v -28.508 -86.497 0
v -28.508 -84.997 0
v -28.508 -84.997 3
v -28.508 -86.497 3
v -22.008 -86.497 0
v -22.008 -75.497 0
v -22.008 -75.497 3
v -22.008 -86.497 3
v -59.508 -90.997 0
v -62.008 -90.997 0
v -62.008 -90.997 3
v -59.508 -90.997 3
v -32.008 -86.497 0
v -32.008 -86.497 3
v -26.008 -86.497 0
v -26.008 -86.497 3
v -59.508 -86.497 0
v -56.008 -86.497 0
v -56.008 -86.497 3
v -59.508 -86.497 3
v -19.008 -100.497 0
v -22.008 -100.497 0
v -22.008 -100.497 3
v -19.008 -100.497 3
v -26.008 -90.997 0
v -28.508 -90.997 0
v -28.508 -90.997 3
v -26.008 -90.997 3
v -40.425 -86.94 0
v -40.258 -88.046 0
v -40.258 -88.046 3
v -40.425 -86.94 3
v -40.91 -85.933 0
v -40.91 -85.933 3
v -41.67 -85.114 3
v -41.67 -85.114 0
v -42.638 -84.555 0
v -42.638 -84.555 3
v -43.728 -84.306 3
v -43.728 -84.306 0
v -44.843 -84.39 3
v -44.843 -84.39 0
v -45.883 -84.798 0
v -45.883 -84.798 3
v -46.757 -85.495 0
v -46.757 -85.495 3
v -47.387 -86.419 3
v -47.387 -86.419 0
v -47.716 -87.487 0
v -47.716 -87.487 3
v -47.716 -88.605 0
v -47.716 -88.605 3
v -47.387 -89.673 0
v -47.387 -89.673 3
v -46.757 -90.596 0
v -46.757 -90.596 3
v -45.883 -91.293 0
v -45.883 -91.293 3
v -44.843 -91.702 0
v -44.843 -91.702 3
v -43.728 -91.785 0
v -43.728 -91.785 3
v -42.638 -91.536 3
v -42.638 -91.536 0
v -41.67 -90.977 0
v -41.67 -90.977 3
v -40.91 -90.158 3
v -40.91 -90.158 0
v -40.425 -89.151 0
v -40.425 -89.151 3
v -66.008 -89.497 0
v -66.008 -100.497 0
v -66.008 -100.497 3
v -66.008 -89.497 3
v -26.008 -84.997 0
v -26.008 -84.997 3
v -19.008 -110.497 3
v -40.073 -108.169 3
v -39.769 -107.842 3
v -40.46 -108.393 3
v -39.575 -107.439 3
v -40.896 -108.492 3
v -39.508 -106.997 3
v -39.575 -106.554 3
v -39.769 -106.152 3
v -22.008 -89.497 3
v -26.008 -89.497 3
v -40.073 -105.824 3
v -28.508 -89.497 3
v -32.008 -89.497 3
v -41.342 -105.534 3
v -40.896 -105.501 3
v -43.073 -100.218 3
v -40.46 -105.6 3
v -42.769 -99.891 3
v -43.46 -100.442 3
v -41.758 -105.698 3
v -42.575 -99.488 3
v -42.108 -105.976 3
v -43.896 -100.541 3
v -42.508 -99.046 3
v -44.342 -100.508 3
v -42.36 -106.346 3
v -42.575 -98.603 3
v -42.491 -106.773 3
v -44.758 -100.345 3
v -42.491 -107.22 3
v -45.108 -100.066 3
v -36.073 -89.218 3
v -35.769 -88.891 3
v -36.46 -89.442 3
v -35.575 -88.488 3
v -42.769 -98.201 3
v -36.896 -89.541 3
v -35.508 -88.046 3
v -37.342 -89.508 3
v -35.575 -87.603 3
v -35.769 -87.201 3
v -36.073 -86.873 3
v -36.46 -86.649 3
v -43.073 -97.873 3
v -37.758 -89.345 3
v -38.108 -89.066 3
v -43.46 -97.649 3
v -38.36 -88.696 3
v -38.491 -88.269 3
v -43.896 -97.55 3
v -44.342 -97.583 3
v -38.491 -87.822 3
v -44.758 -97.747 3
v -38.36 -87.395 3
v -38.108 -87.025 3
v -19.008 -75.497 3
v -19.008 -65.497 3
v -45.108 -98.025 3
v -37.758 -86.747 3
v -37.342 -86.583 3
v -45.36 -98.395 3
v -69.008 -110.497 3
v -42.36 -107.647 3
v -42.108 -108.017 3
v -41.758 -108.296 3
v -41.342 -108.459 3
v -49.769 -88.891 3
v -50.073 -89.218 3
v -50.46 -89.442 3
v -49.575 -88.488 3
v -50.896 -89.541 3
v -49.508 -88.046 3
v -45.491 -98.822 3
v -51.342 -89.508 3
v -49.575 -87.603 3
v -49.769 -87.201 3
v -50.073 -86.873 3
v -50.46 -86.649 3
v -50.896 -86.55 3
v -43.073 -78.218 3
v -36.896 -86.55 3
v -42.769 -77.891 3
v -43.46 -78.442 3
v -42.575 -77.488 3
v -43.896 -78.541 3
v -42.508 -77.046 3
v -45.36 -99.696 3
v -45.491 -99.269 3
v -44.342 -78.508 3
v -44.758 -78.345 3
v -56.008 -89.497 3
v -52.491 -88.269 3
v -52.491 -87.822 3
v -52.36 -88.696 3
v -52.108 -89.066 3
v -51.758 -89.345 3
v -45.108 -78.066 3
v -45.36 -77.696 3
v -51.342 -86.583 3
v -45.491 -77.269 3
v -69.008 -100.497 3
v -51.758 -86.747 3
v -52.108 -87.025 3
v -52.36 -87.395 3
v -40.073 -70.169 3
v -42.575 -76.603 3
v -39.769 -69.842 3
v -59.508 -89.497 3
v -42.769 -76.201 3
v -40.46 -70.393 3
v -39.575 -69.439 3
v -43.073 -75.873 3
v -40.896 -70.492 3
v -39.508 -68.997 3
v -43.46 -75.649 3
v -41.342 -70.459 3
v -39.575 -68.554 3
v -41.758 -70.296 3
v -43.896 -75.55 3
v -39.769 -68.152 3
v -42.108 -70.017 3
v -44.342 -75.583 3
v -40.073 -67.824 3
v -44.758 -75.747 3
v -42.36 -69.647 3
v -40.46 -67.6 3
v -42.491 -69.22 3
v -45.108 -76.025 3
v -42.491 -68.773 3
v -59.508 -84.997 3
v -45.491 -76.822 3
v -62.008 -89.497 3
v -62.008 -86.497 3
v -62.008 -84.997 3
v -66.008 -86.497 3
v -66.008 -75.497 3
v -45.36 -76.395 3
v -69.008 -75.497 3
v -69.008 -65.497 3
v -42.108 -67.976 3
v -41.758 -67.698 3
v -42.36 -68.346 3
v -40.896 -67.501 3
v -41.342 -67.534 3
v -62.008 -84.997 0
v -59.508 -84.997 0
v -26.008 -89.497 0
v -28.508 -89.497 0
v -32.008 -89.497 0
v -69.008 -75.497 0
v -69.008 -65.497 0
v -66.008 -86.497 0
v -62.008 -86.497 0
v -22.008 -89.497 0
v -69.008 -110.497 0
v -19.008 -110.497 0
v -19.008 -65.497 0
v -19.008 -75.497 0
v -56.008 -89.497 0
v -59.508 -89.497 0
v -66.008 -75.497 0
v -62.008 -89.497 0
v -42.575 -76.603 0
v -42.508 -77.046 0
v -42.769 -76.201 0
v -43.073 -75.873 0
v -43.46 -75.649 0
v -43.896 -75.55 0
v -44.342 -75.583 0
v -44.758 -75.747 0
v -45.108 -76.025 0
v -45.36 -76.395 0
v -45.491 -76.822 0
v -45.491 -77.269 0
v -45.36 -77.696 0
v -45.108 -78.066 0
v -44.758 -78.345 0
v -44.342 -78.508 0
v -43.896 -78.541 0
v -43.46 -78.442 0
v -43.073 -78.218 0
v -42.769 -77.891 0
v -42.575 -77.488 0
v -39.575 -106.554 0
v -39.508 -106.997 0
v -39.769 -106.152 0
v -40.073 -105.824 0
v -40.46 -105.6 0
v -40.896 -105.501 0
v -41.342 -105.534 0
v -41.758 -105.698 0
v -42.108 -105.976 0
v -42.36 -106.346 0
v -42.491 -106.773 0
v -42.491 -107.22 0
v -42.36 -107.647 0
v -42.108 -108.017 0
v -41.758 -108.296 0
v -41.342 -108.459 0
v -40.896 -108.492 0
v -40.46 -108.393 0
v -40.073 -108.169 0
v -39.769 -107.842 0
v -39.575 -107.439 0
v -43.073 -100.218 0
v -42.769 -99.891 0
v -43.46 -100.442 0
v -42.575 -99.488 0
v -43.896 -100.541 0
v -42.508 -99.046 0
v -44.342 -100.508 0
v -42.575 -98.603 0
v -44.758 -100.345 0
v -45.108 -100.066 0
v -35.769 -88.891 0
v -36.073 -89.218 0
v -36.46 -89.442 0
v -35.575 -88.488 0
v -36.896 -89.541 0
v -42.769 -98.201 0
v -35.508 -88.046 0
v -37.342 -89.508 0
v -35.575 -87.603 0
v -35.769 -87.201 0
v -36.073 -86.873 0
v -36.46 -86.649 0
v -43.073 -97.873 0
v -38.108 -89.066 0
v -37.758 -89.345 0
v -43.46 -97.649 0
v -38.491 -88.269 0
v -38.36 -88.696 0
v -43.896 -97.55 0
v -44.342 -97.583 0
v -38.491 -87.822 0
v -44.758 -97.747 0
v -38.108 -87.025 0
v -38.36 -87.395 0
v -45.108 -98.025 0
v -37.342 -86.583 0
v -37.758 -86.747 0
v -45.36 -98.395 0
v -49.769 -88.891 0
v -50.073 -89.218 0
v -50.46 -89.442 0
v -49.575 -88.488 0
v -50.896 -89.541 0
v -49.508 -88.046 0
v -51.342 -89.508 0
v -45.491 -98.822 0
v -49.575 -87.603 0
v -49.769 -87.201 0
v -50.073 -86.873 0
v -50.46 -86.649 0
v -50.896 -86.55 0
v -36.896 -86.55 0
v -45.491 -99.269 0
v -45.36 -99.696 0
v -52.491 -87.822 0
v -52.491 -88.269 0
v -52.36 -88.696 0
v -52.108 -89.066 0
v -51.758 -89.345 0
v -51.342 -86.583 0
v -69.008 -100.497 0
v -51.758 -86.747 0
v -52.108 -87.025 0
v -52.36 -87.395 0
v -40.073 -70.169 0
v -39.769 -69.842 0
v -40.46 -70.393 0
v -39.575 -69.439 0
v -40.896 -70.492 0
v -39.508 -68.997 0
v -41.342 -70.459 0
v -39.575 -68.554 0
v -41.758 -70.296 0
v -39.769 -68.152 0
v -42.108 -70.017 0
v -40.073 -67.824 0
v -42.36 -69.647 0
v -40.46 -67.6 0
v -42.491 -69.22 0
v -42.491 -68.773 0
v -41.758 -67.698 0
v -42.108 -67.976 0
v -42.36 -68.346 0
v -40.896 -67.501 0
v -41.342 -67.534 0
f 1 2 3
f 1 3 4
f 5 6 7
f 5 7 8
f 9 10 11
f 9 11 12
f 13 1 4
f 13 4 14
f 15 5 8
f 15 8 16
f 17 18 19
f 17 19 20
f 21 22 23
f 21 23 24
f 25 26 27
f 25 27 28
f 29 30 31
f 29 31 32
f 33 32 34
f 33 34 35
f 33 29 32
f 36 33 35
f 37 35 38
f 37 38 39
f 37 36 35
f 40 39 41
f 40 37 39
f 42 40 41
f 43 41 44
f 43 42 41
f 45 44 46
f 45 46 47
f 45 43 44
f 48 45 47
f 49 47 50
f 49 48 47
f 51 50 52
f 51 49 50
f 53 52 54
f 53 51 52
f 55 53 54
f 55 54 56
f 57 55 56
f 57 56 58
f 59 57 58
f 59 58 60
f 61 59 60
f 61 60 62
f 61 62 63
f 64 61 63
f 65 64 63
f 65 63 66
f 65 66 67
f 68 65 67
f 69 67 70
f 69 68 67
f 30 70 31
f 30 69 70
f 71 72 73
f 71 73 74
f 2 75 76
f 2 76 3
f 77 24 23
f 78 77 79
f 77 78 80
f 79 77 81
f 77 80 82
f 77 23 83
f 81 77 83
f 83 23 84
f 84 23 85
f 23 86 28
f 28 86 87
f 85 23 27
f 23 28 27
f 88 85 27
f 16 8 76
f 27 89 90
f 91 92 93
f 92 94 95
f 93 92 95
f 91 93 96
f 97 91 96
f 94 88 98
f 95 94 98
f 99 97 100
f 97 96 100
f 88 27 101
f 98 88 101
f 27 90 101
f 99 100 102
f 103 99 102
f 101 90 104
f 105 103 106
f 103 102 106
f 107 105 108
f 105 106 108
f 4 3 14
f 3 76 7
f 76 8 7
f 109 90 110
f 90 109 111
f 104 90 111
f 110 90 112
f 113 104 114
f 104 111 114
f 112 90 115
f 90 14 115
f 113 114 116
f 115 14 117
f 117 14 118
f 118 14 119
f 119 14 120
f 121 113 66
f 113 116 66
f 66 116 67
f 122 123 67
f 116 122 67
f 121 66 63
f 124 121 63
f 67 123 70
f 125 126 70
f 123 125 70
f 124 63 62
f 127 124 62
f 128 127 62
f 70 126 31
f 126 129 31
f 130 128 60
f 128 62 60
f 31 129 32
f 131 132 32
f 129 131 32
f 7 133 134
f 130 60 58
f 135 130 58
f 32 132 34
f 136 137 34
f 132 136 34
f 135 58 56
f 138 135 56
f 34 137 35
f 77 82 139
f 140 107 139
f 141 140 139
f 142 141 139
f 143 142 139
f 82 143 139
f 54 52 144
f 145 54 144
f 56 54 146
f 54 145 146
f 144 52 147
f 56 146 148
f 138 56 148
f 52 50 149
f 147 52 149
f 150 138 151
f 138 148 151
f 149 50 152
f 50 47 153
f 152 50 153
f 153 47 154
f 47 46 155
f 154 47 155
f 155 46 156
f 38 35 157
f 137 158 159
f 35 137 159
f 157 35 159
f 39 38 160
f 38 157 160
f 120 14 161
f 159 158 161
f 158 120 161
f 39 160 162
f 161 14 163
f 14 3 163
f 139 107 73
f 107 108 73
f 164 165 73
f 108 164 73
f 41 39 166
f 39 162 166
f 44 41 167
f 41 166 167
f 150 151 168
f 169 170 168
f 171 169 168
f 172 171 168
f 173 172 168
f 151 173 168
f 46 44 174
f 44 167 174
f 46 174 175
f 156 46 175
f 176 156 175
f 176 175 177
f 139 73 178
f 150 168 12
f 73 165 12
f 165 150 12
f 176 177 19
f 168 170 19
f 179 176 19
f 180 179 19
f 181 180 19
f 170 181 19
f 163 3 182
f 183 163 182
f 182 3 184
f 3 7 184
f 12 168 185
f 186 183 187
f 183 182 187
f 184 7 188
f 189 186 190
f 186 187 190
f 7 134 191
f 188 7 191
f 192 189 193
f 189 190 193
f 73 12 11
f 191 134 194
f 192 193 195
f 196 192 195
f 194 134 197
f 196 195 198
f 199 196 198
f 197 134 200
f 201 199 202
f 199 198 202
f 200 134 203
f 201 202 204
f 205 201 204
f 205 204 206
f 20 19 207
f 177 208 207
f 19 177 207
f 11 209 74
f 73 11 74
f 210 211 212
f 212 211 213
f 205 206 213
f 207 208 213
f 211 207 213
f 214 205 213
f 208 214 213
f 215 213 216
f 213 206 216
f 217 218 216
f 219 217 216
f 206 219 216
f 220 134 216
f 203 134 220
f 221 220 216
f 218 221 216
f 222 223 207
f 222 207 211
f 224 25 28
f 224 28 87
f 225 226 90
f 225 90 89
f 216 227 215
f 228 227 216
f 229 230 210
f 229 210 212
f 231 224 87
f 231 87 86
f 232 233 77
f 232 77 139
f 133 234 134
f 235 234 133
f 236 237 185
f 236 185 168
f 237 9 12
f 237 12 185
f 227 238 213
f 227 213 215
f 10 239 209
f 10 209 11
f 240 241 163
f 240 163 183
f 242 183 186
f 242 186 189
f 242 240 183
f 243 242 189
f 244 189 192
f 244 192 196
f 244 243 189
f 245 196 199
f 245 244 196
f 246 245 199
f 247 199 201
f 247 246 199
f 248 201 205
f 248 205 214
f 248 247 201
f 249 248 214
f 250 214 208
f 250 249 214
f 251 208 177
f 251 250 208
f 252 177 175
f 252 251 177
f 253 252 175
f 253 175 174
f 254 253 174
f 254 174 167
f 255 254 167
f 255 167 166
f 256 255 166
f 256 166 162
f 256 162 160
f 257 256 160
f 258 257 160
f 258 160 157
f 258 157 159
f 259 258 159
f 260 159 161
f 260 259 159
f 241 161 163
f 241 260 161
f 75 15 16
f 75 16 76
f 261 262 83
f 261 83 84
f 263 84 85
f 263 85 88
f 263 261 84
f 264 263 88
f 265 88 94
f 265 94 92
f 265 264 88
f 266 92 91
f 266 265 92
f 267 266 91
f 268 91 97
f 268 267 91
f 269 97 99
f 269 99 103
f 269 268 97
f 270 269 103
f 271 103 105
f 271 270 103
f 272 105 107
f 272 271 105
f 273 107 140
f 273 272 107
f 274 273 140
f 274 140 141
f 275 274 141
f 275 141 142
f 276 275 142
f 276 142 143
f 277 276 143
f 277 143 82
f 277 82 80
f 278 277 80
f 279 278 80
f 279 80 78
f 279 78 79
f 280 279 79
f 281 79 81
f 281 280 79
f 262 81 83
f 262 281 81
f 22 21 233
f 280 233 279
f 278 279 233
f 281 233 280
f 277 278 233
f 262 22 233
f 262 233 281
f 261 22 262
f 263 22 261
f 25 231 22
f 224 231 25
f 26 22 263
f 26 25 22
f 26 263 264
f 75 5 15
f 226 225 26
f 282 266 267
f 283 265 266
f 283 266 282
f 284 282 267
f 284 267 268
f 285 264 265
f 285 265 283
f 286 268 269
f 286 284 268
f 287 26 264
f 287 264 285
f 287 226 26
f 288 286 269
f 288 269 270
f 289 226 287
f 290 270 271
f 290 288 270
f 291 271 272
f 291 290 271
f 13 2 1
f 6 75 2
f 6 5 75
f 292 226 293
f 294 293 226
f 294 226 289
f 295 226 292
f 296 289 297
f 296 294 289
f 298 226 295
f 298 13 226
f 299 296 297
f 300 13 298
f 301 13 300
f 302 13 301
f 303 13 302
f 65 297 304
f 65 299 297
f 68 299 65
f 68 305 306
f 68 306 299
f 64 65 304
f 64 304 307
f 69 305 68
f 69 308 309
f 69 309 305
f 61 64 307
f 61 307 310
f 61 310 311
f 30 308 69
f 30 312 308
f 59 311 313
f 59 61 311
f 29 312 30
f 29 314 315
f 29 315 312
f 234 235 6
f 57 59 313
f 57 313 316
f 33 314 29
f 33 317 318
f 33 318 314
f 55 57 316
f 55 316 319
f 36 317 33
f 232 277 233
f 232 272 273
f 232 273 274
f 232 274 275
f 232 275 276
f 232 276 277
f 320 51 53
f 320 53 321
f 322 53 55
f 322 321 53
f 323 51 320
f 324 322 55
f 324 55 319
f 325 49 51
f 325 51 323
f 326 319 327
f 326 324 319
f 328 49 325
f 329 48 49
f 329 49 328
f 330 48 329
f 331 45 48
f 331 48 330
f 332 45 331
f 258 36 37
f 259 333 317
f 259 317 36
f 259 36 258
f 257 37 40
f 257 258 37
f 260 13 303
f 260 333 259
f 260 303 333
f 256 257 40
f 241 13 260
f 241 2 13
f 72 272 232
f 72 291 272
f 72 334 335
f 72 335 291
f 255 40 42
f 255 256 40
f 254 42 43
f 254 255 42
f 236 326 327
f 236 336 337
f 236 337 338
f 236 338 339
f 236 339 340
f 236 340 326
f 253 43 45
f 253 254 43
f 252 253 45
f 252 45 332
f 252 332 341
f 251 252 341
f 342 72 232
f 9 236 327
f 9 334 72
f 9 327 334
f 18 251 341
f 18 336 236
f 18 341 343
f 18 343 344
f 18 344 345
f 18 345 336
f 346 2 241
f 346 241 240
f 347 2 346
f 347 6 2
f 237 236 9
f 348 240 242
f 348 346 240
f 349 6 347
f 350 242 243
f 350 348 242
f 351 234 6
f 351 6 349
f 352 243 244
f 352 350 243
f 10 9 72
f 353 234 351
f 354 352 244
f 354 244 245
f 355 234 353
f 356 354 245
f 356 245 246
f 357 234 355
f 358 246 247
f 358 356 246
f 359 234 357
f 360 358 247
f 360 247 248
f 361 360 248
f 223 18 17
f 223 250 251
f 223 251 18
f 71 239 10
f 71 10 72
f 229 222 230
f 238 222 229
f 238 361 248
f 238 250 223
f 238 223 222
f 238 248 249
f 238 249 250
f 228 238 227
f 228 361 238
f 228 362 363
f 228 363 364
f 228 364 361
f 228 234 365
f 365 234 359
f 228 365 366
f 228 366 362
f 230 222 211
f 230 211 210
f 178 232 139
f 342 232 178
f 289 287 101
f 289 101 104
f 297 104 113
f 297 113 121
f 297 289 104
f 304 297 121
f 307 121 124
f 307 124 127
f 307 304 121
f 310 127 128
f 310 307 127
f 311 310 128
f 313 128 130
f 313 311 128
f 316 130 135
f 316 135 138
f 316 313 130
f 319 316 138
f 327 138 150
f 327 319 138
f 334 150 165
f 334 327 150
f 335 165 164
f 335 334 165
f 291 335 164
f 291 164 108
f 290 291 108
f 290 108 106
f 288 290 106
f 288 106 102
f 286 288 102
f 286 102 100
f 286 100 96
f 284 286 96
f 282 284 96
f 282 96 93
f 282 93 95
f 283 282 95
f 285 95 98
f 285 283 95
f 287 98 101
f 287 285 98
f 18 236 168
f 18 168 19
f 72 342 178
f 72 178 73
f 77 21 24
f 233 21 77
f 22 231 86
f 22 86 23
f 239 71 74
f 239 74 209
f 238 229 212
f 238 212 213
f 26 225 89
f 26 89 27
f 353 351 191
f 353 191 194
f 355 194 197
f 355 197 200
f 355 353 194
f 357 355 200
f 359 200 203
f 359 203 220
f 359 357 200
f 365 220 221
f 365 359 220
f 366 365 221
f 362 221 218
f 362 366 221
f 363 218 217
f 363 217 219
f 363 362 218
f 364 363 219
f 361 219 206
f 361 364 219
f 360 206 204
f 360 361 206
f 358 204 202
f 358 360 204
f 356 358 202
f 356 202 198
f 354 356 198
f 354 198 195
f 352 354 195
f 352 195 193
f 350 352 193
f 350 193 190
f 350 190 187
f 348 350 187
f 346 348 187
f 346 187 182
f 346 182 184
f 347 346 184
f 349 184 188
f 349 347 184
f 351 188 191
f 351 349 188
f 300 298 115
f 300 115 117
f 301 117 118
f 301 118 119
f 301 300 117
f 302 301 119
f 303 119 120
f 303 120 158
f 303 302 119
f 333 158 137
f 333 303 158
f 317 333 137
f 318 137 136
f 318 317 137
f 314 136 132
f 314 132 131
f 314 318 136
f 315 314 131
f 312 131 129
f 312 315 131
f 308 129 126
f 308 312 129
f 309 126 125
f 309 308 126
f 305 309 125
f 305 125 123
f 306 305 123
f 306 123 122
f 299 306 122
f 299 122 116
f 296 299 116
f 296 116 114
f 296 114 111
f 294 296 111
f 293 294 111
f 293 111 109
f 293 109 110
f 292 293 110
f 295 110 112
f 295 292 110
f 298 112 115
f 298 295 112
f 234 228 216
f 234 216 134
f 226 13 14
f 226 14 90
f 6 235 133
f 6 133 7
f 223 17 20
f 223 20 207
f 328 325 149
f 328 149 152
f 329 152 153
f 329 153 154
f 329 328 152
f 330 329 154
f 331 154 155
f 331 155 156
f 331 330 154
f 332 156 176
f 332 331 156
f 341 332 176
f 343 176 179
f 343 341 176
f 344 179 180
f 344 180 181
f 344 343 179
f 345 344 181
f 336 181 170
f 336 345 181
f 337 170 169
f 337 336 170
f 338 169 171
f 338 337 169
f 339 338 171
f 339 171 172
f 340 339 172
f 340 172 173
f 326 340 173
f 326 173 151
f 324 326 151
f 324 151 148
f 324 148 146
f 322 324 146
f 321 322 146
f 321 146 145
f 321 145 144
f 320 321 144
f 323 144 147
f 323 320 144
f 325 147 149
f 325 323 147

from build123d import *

# Parameters (mm, degrees)
ESQUISSE11_R        = 3.75
ESQUISSE11_R_2      = 1.5
BOSS_EXTRU_11_DEPTH = 3


with BuildPart() as part:
    # Esquisse11 → Boss.-Extru.11 (new body)
    with BuildSketch(Plane.XY):
        Polygon((-66.008134961, -86.49661352), (-66.008134961, -75.49661352), (-69.008134961, -75.49661352), (-69.008134961, -65.49661352), (-19.008134961, -65.49661352), (-19.008134961, -75.49661352), (-22.008134961, -75.49661352), (-22.008134961, -86.49661352), (-26.008134961, -86.49661352), (-26.008134961, -84.99661352), (-28.508134961, -84.99661352), (-28.508134961, -86.49661352), (-32.008134961, -86.49661352), (-32.008134961, -89.49661352), (-28.508134961, -89.49661352), (-28.508134961, -90.99661352), (-26.008134961, -90.99661352), (-26.008134961, -89.49661352), (-22.008134961, -89.49661352), (-22.008134961, -100.49661352), (-19.008134961, -100.49661352), (-19.008134961, -110.49661352), (-69.008134961, -110.49661352), (-69.008134961, -100.49661352), (-66.008134961, -100.49661352), (-66.008134961, -89.49661352), (-62.008134961, -89.49661352), (-62.008134961, -90.99661352), (-59.508134961, -90.99661352), (-59.508134961, -89.49661352), (-56.008134961, -89.49661352), (-56.008134961, -86.49661352), (-59.508134961, -86.49661352), (-59.508134961, -84.99661352), (-62.008134961, -84.99661352), (-62.008134961, -86.49661352), align=None)
        with Locations((-44.008134961, -88.045619642)):
            Circle(ESQUISSE11_R, mode=Mode.SUBTRACT)
        with Locations((-37.008134961, -88.045619642)):
            Circle(ESQUISSE11_R_2, mode=Mode.SUBTRACT)
        with Locations((-51.008134961, -88.045619642)):
            Circle(ESQUISSE11_R_2, mode=Mode.SUBTRACT)
        with Locations((-44.008134961, -77.045619642)):
            Circle(ESQUISSE11_R_2, mode=Mode.SUBTRACT)
        with Locations((-44.008134961, -99.045619642)):
            Circle(ESQUISSE11_R_2, mode=Mode.SUBTRACT)
        with Locations((-41.008134961, -68.99661352)):
            Circle(ESQUISSE11_R_2, mode=Mode.SUBTRACT)
        with Locations((-41.008134961, -106.99661352)):
            Circle(ESQUISSE11_R_2, mode=Mode.SUBTRACT)
    extrude(amount=BOSS_EXTRU_11_DEPTH)


solid = part.part
